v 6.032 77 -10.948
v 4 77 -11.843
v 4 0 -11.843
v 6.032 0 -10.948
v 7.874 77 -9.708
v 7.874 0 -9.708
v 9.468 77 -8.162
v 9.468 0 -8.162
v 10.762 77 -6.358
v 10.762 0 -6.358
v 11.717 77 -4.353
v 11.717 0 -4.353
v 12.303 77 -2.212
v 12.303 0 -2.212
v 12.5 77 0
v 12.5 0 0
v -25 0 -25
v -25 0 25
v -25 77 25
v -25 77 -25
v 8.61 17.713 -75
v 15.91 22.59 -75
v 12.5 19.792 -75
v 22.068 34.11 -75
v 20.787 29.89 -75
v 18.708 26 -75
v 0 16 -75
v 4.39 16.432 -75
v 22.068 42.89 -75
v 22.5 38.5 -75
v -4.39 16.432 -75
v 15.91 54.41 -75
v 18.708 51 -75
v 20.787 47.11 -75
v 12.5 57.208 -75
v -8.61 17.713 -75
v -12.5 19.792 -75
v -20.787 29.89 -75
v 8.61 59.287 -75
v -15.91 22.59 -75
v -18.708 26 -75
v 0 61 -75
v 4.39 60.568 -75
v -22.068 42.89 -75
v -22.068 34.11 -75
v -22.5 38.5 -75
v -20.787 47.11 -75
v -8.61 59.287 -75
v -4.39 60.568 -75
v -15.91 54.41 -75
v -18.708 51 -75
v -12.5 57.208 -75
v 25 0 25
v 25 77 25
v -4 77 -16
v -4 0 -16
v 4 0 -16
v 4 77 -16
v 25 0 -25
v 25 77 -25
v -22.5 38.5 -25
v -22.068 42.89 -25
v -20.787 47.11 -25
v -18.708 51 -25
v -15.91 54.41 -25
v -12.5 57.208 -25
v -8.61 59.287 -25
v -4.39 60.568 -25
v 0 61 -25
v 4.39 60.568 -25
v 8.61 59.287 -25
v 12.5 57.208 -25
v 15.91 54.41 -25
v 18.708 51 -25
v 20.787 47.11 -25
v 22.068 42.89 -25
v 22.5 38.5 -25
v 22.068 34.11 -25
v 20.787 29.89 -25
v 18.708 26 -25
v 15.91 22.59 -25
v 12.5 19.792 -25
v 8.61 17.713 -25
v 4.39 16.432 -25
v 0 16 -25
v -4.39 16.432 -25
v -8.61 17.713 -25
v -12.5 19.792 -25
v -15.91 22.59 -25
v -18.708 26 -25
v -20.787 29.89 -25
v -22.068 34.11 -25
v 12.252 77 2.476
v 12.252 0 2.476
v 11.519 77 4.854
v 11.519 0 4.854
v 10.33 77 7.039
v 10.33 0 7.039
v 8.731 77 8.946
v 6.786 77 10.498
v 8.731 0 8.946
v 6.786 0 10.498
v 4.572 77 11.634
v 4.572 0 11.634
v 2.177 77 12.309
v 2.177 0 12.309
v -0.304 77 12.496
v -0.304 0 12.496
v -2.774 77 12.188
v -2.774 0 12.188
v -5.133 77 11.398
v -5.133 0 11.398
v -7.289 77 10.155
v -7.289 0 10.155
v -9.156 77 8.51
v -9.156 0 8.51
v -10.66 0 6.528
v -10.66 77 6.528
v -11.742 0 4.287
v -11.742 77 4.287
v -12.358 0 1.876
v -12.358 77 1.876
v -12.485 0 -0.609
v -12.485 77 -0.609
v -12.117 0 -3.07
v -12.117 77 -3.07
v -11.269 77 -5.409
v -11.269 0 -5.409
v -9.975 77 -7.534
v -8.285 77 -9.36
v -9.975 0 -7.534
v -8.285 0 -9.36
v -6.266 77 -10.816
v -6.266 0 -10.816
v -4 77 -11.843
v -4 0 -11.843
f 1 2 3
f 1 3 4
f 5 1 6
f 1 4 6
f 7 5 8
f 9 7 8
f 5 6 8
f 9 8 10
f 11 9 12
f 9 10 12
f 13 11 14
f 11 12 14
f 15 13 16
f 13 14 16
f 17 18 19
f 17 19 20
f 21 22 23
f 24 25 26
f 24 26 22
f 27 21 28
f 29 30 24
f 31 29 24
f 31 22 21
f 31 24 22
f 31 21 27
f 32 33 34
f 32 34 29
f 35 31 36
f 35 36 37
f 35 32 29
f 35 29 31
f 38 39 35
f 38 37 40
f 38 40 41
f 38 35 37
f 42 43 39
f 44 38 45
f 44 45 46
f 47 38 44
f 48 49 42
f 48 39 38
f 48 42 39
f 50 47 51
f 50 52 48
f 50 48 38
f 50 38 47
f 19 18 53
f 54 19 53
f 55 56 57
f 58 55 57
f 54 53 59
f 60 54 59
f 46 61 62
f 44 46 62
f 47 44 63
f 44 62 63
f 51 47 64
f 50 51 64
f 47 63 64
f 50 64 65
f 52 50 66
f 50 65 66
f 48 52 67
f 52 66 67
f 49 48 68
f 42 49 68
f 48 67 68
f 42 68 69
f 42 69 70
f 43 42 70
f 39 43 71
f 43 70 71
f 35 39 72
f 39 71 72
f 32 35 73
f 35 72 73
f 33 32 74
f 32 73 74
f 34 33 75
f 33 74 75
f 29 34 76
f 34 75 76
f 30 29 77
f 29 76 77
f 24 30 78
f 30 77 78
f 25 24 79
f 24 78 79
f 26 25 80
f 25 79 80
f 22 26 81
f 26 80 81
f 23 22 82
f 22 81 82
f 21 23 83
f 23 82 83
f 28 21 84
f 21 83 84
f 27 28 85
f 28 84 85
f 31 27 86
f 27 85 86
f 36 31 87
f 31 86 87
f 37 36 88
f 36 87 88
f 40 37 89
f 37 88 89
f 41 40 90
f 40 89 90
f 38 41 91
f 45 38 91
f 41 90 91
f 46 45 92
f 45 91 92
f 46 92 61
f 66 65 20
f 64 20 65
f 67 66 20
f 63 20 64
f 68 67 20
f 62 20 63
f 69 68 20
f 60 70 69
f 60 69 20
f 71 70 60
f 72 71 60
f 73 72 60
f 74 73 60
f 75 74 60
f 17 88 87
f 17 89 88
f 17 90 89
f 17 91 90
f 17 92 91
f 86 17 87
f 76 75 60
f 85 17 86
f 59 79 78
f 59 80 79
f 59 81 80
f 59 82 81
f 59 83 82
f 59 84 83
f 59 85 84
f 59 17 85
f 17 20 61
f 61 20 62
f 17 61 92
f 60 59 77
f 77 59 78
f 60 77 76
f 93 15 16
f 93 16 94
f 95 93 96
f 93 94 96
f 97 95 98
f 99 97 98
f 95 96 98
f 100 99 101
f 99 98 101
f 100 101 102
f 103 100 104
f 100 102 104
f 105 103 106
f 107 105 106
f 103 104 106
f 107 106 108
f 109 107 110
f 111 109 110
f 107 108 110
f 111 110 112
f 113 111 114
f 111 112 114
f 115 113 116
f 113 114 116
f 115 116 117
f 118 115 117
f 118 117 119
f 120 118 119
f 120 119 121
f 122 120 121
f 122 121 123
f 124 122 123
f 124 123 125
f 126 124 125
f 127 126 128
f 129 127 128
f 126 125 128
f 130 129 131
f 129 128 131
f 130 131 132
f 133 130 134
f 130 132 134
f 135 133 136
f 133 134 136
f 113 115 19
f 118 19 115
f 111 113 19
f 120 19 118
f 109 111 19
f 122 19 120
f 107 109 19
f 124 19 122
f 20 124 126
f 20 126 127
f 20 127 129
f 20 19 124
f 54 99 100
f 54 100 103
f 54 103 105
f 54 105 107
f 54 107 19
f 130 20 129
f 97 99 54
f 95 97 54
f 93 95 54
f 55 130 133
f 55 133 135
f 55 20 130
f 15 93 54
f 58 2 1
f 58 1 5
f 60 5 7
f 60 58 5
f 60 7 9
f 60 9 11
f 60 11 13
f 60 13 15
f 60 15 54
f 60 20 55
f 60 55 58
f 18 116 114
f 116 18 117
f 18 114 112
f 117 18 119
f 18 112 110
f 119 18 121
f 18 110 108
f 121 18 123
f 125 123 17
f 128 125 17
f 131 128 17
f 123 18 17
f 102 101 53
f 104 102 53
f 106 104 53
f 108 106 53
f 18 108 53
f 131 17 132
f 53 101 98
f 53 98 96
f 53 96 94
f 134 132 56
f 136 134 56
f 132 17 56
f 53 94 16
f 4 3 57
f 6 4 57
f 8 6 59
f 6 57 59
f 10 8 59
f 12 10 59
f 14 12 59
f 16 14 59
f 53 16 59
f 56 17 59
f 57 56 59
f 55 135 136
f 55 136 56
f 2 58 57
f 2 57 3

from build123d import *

# Parameters (mm, degrees)
SKETCH1_W           = 50
SKETCH1_H           = 50
BOSS_EXTRUDE1_DEPTH = 77
SKETCH2_R           = 22.5
BOSS_EXTRUDE2_DEPTH = 50


with BuildPart() as part:
    # Sketch1 → Boss-Extrude1 (new body)
    with BuildSketch(Plane(origin=(0, 0, 0), x_dir=(1, 0, 0), z_dir=(0, 1, 0))):
        Rectangle(SKETCH1_W, SKETCH1_H)
        with BuildLine():
            Line((4, 16), (4, 11.842719282))
            ThreePointArc((4, 11.842719282), (10.155048006, 7.288689869), (12.5, 0))
            ThreePointArc((12.5, 0), (-7.288689869, -10.155048006), (-4, 11.842719282))
            Line((-4, 11.842719282), (-4, 16))
            Line((-4, 16), (4, 16))
        make_face(mode=Mode.SUBTRACT)
    extrude(amount=BOSS_EXTRUDE1_DEPTH)

    # Sketch2 → Boss-Extrude2 (add)
    with BuildSketch(Plane(origin=(0, 0, -25), x_dir=(-1, 0, 0), z_dir=(0, 0, -1))):
        with Locations((0, 38.5)):
            Circle(SKETCH2_R)
    extrude(amount=BOSS_EXTRUDE2_DEPTH)


solid = part.part
